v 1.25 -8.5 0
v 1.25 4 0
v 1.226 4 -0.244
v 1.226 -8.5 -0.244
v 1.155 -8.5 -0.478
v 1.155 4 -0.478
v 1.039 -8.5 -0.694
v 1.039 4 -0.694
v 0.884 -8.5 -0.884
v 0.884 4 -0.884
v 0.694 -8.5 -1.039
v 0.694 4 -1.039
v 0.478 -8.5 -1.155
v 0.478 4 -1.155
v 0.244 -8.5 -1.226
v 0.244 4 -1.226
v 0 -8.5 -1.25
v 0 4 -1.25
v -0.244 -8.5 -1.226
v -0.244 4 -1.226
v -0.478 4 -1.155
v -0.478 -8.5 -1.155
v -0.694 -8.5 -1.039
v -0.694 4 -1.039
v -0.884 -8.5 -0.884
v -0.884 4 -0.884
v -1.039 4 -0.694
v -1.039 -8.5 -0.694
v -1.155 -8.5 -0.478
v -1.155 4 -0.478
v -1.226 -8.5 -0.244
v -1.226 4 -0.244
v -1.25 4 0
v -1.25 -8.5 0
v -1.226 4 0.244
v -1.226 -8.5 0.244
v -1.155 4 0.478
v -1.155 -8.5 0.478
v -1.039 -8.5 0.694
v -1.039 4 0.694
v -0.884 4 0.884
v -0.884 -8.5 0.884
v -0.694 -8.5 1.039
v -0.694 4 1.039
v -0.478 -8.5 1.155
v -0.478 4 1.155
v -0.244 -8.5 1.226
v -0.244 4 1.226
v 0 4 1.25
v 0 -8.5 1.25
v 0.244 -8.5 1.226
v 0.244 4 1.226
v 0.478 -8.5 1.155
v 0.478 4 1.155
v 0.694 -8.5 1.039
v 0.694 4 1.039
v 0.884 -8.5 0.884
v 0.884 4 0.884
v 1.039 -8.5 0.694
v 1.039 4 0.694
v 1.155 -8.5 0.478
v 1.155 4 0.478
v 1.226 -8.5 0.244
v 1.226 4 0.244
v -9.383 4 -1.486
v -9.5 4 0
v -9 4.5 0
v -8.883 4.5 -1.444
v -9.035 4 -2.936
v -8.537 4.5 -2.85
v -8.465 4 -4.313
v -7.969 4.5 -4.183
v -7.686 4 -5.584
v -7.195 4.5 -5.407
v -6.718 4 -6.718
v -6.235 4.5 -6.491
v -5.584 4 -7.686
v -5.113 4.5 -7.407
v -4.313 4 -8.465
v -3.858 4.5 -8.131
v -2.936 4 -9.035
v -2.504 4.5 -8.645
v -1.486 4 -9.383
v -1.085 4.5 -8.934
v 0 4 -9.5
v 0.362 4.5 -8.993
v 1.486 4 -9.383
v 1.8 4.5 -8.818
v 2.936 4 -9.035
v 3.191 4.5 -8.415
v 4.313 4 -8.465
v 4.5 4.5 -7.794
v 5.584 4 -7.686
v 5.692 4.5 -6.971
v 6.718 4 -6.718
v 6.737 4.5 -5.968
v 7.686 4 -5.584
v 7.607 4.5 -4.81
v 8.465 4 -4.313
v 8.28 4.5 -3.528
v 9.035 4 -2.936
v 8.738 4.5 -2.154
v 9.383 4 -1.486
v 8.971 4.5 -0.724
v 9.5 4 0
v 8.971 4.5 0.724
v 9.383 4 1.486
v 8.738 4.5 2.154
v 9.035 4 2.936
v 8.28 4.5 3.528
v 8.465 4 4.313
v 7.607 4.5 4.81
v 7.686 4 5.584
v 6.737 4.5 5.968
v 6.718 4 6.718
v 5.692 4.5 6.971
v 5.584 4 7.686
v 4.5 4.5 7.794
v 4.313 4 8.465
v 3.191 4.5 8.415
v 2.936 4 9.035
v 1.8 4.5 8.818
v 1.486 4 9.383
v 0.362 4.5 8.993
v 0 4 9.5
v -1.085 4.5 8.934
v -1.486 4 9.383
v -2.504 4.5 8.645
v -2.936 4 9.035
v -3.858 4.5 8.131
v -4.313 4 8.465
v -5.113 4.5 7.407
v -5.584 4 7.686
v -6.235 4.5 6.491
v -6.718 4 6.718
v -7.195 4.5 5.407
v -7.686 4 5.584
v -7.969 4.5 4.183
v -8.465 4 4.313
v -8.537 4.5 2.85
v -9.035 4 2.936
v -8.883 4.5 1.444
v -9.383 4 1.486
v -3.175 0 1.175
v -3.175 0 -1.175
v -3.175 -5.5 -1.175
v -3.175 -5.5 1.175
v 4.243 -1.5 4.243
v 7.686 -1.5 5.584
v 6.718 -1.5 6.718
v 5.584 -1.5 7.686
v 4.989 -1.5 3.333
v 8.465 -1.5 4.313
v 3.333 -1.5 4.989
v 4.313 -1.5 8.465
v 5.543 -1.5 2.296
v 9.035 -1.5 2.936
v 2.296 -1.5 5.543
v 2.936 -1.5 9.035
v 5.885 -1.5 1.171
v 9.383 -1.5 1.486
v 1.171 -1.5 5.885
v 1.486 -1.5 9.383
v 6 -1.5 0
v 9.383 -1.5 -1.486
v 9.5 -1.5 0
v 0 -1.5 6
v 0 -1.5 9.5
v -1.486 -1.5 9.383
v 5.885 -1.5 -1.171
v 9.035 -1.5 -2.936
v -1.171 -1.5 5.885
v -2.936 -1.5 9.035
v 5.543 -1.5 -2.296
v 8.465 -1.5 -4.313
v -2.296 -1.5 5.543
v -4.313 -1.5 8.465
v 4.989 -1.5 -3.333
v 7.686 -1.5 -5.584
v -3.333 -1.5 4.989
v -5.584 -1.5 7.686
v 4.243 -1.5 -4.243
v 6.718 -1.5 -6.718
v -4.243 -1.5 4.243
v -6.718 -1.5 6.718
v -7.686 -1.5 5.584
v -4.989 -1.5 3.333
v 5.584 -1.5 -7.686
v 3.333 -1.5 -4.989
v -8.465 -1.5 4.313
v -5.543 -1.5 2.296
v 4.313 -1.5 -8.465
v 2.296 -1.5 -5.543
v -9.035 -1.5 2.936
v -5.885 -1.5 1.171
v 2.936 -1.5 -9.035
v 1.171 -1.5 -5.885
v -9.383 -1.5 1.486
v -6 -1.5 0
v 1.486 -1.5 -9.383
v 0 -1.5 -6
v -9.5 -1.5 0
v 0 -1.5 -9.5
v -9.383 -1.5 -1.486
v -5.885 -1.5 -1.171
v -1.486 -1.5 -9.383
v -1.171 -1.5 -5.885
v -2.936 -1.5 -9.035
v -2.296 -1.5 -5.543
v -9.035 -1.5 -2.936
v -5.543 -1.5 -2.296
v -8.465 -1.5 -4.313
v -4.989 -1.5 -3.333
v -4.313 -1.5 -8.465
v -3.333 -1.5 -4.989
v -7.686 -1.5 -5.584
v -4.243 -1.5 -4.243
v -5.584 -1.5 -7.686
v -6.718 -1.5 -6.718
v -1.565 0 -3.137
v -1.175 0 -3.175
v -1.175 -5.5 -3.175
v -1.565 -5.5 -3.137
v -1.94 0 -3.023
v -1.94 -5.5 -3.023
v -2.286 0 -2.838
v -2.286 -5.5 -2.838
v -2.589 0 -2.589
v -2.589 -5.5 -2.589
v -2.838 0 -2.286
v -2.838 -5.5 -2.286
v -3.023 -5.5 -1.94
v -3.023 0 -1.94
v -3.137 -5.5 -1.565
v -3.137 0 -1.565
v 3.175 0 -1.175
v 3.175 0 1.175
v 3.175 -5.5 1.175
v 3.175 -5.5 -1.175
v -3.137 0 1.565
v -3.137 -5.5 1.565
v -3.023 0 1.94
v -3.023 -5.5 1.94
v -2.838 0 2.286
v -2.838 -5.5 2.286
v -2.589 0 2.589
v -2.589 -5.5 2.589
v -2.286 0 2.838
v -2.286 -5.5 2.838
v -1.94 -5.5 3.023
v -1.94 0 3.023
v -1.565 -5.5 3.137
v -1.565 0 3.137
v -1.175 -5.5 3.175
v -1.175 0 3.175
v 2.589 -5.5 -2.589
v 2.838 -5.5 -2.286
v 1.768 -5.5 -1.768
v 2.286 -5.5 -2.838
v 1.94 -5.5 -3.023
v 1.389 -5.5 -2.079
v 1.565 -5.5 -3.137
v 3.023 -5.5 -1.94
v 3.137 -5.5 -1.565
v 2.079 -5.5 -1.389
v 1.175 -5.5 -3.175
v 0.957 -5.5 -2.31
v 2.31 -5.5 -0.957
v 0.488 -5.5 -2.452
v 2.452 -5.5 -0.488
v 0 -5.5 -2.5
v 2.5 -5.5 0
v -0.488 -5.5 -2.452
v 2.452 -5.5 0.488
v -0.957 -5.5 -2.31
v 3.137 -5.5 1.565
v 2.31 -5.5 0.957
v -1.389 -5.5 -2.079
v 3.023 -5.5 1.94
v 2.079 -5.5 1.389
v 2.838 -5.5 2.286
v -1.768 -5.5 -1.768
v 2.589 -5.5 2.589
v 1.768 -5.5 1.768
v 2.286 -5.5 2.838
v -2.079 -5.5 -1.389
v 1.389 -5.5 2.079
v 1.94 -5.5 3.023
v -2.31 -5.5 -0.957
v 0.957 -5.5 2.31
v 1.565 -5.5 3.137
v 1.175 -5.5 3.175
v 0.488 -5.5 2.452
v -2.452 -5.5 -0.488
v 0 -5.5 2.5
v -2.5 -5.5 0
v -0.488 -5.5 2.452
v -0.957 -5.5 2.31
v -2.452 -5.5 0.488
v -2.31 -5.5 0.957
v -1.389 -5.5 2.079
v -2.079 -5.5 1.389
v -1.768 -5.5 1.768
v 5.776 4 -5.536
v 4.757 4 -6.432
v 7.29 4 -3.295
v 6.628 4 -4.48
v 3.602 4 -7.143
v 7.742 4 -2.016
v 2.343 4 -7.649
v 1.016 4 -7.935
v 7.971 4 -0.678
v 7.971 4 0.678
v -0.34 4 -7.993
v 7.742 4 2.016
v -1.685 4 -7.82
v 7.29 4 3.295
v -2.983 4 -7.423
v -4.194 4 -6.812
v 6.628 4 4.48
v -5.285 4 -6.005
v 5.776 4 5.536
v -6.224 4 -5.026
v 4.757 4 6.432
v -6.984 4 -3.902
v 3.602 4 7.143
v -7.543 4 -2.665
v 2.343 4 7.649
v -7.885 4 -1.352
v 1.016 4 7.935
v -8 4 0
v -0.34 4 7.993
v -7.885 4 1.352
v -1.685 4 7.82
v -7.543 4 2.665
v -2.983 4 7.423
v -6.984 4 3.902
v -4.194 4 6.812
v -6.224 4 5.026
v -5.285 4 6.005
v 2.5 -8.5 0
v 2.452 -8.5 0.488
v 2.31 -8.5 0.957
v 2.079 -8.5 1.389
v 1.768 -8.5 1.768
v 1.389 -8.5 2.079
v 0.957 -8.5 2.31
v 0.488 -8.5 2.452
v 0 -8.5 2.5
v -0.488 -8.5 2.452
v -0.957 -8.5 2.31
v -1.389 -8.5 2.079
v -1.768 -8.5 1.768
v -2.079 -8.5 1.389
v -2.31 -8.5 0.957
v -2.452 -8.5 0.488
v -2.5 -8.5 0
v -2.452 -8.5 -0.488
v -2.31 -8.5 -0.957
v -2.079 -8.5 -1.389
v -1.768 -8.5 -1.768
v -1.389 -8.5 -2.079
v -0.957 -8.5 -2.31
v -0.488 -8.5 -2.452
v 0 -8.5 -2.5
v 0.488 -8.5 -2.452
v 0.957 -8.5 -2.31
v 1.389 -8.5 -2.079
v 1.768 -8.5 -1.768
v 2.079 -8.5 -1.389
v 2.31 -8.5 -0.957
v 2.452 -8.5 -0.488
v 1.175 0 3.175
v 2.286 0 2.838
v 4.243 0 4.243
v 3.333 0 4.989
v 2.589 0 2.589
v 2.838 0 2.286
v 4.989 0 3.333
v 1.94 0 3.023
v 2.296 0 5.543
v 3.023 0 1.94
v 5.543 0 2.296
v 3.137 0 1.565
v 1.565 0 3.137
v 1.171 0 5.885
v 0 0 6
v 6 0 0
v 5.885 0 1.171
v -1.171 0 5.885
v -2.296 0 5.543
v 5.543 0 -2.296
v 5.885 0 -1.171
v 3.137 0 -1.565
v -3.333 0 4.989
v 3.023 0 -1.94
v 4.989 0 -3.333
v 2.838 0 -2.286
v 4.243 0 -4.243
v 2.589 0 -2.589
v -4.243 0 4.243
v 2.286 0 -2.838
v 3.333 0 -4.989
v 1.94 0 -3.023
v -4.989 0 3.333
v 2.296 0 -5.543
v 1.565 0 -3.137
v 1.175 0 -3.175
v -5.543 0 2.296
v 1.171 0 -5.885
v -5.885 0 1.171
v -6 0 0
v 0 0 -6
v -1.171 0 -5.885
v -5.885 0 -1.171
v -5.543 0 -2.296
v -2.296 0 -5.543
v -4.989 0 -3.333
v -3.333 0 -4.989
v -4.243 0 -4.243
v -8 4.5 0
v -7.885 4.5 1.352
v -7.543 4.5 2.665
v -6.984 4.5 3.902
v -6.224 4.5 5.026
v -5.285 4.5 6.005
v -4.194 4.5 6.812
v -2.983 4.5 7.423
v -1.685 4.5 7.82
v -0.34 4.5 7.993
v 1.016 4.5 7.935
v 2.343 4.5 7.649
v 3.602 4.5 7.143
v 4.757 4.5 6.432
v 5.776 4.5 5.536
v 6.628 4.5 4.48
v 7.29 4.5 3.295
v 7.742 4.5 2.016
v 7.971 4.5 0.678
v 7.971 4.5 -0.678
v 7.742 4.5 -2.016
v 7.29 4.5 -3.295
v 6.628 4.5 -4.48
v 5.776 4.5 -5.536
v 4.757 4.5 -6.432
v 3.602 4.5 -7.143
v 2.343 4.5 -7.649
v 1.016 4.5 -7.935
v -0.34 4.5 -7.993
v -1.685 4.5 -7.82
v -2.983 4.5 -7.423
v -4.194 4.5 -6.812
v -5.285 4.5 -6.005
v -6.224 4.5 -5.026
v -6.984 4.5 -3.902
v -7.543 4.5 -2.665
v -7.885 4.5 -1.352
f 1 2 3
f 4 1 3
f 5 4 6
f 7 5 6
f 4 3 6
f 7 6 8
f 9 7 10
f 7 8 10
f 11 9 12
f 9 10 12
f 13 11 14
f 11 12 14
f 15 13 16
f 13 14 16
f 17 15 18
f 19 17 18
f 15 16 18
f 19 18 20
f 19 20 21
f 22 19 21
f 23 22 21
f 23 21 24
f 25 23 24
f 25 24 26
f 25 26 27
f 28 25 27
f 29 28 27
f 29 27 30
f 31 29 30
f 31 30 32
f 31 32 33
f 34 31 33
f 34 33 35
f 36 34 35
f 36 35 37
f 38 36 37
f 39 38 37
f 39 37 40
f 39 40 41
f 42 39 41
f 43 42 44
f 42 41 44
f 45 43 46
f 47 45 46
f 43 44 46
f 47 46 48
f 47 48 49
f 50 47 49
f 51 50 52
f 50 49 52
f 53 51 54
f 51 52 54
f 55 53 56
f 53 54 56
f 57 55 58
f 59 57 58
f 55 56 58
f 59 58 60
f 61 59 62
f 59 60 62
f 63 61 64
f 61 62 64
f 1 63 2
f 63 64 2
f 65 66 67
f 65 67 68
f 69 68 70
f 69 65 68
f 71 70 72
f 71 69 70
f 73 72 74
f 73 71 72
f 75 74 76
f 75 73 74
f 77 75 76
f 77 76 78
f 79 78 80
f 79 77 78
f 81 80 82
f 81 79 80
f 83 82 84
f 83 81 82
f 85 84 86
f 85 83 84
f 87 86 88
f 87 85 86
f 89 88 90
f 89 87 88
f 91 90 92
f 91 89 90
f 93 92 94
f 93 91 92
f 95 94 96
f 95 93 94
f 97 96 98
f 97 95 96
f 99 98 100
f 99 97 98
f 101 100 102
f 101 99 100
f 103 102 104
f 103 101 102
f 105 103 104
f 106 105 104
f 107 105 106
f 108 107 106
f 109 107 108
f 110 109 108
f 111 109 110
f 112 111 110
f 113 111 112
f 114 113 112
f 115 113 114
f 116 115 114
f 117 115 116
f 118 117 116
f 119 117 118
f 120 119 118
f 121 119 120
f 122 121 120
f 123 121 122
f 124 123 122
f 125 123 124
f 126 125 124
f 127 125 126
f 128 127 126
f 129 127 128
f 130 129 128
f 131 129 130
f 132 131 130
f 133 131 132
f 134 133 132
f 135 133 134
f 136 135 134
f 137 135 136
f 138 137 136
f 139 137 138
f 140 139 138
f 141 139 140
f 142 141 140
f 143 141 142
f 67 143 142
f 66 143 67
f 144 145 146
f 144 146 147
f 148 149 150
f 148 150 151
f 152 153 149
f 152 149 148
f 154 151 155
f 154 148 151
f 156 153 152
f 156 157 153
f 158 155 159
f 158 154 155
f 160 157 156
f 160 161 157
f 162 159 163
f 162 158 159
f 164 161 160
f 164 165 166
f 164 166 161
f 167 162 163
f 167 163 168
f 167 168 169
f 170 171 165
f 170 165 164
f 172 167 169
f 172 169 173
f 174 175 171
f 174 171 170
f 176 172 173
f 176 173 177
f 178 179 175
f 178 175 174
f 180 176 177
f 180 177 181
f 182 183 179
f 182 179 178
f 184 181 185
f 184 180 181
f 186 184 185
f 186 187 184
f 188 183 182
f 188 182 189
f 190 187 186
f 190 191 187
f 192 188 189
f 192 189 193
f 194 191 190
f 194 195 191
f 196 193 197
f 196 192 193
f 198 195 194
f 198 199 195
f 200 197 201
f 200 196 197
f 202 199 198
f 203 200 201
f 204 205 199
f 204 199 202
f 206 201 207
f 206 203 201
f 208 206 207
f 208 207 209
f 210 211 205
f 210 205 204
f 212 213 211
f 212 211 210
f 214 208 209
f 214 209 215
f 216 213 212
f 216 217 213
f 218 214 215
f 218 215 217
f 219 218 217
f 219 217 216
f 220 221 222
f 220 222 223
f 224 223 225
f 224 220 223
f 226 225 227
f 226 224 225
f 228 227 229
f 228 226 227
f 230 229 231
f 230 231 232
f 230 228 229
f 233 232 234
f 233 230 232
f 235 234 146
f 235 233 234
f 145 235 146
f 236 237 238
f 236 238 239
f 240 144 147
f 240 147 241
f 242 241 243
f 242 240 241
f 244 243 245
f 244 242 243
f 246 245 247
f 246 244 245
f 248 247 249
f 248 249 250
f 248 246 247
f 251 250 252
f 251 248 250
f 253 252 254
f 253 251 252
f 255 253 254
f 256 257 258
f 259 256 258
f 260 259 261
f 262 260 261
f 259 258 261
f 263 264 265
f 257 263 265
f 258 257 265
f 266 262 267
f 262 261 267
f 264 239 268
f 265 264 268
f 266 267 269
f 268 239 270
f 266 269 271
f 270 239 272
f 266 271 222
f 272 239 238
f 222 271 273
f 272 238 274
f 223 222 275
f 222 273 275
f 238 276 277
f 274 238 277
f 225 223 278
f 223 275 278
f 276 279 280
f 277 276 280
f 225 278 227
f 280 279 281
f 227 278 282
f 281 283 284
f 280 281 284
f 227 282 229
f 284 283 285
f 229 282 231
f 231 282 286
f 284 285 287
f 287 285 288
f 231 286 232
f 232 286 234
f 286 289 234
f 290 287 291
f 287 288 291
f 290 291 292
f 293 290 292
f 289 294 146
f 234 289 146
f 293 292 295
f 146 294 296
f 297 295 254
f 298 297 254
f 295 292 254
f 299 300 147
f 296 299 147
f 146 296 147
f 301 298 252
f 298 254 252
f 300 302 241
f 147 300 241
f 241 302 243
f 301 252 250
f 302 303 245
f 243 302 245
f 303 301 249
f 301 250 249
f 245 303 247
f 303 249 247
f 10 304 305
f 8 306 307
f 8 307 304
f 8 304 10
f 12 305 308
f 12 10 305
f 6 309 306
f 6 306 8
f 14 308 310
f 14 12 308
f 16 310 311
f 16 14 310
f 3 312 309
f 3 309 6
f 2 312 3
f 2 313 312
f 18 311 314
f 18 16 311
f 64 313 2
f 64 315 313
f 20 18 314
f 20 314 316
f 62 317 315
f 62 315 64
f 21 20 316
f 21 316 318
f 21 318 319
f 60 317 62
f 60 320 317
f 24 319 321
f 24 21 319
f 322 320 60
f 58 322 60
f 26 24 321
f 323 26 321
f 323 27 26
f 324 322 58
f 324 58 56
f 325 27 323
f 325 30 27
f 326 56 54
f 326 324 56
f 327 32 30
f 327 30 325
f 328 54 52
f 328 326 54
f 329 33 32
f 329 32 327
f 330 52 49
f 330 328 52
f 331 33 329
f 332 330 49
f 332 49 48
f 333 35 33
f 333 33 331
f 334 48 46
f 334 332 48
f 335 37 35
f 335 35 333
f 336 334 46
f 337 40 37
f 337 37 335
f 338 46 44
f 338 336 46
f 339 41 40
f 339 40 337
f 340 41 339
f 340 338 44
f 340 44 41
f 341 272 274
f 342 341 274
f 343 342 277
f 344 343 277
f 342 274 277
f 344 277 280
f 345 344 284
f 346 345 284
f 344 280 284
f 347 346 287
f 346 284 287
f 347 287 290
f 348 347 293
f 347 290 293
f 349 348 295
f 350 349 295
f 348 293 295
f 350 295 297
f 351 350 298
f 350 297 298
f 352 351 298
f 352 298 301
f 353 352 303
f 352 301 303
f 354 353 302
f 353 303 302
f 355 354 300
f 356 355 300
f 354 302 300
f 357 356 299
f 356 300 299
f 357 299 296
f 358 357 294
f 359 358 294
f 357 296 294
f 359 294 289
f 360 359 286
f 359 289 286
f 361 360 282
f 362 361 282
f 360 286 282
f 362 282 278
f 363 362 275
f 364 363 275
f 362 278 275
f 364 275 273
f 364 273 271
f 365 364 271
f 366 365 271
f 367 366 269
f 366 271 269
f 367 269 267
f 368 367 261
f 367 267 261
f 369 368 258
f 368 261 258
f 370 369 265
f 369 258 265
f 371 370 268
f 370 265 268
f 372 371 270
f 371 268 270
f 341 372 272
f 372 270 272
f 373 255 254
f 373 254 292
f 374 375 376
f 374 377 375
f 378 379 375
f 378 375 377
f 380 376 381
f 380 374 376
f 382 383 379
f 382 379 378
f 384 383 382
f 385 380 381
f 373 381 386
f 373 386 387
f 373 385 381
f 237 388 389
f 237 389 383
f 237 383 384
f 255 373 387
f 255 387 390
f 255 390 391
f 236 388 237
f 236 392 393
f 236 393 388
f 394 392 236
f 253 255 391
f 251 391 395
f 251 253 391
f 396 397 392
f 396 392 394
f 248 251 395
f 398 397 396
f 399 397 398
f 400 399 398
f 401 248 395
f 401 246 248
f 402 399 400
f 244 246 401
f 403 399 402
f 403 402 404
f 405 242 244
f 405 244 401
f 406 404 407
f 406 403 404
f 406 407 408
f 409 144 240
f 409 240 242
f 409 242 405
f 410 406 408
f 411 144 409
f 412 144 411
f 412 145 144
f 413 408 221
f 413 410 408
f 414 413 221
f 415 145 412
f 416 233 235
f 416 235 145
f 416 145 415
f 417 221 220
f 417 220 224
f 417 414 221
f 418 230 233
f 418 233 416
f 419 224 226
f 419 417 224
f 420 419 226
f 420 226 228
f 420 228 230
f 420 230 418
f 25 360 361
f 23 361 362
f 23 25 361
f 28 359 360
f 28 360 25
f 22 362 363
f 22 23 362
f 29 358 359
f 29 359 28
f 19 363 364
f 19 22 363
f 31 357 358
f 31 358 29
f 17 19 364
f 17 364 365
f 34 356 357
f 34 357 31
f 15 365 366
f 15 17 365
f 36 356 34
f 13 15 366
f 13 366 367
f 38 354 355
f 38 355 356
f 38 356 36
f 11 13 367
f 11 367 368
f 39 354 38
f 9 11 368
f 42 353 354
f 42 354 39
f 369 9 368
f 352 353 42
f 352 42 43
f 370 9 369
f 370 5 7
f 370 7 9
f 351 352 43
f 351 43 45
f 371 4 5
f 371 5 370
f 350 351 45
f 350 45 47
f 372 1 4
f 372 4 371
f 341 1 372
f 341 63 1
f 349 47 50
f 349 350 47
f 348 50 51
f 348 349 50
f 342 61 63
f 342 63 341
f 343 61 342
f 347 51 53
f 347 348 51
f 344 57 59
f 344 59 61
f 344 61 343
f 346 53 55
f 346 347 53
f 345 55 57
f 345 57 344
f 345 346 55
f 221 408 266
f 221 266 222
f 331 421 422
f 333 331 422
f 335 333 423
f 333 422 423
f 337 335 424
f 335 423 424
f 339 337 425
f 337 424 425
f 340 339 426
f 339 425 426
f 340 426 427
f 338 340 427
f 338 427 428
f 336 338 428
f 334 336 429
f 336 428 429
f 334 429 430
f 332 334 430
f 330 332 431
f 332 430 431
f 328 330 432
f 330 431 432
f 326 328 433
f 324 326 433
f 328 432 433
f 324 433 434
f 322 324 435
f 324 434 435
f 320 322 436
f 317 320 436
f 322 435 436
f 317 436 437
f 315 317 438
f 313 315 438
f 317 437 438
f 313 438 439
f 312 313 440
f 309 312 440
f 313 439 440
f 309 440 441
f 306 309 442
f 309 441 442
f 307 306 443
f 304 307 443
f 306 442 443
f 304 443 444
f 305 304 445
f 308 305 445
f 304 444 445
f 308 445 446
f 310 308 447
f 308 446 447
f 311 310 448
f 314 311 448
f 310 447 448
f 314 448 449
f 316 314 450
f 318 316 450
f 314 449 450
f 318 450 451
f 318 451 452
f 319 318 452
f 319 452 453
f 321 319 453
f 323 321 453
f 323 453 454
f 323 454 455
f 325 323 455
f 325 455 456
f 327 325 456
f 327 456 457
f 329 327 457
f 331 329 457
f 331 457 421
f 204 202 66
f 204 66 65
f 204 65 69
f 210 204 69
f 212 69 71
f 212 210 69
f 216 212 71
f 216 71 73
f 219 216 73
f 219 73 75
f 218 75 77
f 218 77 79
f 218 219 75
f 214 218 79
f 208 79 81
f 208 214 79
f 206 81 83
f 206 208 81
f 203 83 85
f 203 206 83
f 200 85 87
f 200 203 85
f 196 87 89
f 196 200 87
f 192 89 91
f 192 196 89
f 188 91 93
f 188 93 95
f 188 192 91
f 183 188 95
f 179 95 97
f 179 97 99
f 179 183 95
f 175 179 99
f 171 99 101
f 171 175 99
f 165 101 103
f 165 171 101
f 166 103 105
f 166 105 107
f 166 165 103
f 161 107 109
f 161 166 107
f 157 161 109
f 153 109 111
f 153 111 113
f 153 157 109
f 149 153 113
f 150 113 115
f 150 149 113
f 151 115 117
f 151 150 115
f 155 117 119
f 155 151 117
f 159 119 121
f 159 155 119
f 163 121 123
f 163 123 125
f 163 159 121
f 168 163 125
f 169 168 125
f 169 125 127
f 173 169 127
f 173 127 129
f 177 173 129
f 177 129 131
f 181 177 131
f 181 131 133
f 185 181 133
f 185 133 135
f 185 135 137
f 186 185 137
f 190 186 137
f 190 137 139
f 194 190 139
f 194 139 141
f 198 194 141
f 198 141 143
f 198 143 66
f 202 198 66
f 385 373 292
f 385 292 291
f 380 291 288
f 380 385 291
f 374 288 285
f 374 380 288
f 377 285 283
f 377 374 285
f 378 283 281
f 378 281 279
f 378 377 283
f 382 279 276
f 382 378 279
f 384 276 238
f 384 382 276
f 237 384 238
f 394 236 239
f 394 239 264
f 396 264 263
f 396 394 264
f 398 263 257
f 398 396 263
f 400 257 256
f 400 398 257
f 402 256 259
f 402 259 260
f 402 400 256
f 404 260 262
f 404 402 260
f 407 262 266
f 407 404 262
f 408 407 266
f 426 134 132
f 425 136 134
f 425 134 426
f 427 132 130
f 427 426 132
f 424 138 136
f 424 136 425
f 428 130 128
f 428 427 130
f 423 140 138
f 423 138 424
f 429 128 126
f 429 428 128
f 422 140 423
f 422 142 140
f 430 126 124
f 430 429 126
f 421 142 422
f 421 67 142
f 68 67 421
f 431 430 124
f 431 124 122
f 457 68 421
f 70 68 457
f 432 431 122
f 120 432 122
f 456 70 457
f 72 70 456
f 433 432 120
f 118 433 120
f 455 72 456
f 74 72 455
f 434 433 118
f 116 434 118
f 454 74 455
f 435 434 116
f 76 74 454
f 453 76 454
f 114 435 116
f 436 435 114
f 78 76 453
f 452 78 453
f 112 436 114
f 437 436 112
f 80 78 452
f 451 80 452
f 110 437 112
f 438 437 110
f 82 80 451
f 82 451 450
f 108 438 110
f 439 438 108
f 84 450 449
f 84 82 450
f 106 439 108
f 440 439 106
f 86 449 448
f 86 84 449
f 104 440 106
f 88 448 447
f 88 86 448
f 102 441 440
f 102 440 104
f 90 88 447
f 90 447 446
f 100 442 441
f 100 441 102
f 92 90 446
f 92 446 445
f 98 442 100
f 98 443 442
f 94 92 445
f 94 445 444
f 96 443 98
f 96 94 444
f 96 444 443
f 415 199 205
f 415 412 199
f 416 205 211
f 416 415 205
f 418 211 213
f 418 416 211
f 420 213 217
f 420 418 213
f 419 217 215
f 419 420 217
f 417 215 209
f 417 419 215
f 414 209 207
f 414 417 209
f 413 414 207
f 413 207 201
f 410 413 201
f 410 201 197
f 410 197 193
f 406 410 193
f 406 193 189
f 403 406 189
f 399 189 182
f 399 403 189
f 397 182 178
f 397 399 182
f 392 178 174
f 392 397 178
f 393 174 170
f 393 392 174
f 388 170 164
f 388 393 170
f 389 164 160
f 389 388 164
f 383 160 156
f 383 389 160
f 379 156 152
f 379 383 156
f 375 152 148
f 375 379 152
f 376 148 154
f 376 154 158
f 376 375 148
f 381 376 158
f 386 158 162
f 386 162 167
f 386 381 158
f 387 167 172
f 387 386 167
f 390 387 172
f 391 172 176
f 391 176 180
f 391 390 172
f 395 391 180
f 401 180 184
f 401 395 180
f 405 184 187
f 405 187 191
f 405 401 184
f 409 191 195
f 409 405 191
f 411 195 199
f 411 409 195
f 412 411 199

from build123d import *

# Parameters (mm, degrees)
CHAMFER_1_SIZE         = 0.5
EXTRUDE_1649_DEPTH     = 5.5
SKETCH_6_R             = 8
CUT_EXTRUDE_1797_DEPTH = 0.5
SKETCH_9_R             = 2.5
EXTRUDE_1978_DEPTH     = 3
HOLE_WIZARD_M2_5_D     = 2.5


with BuildPart() as part:
    # Эскиз2 → Revolve 1260 (revolve)
    with BuildSketch(Plane.XY):
        Polygon((0, 4.5), (-9.5, 4.5), (-9.5, -1.5), (-6, -1.5), (-6, 0), (0, 0), align=None)
    revolve(axis=Axis((0, 4.5, 0), (0, -1, 0)))

    # Фаска1
    chamfer_1_edges = [part.edges().sort_by_distance(p)[0] for p in [
        (9.5, 4.5, 0),
    ]]
    chamfer(chamfer_1_edges, length=CHAMFER_1_SIZE)

    # Эскиз8 → Extrude 1649 (add)
    with BuildSketch(Plane.XZ):
        with BuildLine():
            Line((-1.175, 3.175), (1.175, 3.175))
            ThreePointArc((1.175, 3.175), (2.589213562, 2.589213562), (3.175, 1.175))
            Line((3.175, 1.175), (3.175, -1.175))
            ThreePointArc((3.175, -1.175), (2.589213562, -2.589213562), (1.175, -3.175))
            Line((1.175, -3.175), (-1.175, -3.175))
            ThreePointArc((-1.175, -3.175), (-2.589213562, -2.589213562), (-3.175, -1.175))
            Line((-3.175, -1.175), (-3.175, 1.175))
            ThreePointArc((-3.175, 1.175), (-2.589213562, 2.589213562), (-1.175, 3.175))
        make_face()
    extrude(amount=EXTRUDE_1649_DEPTH)

    # Эскиз6 → Cut-Extrude 1797 (cut)
    with BuildSketch(Plane(origin=(0, 4.5, 0), x_dir=(1, 0, 0), z_dir=(0, 1, 0))):
        with Locations(Location((0, 0, 0), (0, 0, 180))):
            Circle(SKETCH_6_R)
    extrude(amount=-CUT_EXTRUDE_1797_DEPTH, mode=Mode.SUBTRACT)

    # Эскиз9 → Extrude 1978 (add)
    with BuildSketch(Plane.XZ.offset(5.5)):
        Circle(SKETCH_9_R)
    extrude(amount=EXTRUDE_1978_DEPTH)

    # Отверстие M2,5 (through all)
    with Locations(Plane(origin=(0, -8.5, 0), x_dir=(-1, 0, 0), z_dir=(0, -1, 0))):
        with Locations((0, 0)):
            Hole(HOLE_WIZARD_M2_5_D / 2)


solid = part.part
